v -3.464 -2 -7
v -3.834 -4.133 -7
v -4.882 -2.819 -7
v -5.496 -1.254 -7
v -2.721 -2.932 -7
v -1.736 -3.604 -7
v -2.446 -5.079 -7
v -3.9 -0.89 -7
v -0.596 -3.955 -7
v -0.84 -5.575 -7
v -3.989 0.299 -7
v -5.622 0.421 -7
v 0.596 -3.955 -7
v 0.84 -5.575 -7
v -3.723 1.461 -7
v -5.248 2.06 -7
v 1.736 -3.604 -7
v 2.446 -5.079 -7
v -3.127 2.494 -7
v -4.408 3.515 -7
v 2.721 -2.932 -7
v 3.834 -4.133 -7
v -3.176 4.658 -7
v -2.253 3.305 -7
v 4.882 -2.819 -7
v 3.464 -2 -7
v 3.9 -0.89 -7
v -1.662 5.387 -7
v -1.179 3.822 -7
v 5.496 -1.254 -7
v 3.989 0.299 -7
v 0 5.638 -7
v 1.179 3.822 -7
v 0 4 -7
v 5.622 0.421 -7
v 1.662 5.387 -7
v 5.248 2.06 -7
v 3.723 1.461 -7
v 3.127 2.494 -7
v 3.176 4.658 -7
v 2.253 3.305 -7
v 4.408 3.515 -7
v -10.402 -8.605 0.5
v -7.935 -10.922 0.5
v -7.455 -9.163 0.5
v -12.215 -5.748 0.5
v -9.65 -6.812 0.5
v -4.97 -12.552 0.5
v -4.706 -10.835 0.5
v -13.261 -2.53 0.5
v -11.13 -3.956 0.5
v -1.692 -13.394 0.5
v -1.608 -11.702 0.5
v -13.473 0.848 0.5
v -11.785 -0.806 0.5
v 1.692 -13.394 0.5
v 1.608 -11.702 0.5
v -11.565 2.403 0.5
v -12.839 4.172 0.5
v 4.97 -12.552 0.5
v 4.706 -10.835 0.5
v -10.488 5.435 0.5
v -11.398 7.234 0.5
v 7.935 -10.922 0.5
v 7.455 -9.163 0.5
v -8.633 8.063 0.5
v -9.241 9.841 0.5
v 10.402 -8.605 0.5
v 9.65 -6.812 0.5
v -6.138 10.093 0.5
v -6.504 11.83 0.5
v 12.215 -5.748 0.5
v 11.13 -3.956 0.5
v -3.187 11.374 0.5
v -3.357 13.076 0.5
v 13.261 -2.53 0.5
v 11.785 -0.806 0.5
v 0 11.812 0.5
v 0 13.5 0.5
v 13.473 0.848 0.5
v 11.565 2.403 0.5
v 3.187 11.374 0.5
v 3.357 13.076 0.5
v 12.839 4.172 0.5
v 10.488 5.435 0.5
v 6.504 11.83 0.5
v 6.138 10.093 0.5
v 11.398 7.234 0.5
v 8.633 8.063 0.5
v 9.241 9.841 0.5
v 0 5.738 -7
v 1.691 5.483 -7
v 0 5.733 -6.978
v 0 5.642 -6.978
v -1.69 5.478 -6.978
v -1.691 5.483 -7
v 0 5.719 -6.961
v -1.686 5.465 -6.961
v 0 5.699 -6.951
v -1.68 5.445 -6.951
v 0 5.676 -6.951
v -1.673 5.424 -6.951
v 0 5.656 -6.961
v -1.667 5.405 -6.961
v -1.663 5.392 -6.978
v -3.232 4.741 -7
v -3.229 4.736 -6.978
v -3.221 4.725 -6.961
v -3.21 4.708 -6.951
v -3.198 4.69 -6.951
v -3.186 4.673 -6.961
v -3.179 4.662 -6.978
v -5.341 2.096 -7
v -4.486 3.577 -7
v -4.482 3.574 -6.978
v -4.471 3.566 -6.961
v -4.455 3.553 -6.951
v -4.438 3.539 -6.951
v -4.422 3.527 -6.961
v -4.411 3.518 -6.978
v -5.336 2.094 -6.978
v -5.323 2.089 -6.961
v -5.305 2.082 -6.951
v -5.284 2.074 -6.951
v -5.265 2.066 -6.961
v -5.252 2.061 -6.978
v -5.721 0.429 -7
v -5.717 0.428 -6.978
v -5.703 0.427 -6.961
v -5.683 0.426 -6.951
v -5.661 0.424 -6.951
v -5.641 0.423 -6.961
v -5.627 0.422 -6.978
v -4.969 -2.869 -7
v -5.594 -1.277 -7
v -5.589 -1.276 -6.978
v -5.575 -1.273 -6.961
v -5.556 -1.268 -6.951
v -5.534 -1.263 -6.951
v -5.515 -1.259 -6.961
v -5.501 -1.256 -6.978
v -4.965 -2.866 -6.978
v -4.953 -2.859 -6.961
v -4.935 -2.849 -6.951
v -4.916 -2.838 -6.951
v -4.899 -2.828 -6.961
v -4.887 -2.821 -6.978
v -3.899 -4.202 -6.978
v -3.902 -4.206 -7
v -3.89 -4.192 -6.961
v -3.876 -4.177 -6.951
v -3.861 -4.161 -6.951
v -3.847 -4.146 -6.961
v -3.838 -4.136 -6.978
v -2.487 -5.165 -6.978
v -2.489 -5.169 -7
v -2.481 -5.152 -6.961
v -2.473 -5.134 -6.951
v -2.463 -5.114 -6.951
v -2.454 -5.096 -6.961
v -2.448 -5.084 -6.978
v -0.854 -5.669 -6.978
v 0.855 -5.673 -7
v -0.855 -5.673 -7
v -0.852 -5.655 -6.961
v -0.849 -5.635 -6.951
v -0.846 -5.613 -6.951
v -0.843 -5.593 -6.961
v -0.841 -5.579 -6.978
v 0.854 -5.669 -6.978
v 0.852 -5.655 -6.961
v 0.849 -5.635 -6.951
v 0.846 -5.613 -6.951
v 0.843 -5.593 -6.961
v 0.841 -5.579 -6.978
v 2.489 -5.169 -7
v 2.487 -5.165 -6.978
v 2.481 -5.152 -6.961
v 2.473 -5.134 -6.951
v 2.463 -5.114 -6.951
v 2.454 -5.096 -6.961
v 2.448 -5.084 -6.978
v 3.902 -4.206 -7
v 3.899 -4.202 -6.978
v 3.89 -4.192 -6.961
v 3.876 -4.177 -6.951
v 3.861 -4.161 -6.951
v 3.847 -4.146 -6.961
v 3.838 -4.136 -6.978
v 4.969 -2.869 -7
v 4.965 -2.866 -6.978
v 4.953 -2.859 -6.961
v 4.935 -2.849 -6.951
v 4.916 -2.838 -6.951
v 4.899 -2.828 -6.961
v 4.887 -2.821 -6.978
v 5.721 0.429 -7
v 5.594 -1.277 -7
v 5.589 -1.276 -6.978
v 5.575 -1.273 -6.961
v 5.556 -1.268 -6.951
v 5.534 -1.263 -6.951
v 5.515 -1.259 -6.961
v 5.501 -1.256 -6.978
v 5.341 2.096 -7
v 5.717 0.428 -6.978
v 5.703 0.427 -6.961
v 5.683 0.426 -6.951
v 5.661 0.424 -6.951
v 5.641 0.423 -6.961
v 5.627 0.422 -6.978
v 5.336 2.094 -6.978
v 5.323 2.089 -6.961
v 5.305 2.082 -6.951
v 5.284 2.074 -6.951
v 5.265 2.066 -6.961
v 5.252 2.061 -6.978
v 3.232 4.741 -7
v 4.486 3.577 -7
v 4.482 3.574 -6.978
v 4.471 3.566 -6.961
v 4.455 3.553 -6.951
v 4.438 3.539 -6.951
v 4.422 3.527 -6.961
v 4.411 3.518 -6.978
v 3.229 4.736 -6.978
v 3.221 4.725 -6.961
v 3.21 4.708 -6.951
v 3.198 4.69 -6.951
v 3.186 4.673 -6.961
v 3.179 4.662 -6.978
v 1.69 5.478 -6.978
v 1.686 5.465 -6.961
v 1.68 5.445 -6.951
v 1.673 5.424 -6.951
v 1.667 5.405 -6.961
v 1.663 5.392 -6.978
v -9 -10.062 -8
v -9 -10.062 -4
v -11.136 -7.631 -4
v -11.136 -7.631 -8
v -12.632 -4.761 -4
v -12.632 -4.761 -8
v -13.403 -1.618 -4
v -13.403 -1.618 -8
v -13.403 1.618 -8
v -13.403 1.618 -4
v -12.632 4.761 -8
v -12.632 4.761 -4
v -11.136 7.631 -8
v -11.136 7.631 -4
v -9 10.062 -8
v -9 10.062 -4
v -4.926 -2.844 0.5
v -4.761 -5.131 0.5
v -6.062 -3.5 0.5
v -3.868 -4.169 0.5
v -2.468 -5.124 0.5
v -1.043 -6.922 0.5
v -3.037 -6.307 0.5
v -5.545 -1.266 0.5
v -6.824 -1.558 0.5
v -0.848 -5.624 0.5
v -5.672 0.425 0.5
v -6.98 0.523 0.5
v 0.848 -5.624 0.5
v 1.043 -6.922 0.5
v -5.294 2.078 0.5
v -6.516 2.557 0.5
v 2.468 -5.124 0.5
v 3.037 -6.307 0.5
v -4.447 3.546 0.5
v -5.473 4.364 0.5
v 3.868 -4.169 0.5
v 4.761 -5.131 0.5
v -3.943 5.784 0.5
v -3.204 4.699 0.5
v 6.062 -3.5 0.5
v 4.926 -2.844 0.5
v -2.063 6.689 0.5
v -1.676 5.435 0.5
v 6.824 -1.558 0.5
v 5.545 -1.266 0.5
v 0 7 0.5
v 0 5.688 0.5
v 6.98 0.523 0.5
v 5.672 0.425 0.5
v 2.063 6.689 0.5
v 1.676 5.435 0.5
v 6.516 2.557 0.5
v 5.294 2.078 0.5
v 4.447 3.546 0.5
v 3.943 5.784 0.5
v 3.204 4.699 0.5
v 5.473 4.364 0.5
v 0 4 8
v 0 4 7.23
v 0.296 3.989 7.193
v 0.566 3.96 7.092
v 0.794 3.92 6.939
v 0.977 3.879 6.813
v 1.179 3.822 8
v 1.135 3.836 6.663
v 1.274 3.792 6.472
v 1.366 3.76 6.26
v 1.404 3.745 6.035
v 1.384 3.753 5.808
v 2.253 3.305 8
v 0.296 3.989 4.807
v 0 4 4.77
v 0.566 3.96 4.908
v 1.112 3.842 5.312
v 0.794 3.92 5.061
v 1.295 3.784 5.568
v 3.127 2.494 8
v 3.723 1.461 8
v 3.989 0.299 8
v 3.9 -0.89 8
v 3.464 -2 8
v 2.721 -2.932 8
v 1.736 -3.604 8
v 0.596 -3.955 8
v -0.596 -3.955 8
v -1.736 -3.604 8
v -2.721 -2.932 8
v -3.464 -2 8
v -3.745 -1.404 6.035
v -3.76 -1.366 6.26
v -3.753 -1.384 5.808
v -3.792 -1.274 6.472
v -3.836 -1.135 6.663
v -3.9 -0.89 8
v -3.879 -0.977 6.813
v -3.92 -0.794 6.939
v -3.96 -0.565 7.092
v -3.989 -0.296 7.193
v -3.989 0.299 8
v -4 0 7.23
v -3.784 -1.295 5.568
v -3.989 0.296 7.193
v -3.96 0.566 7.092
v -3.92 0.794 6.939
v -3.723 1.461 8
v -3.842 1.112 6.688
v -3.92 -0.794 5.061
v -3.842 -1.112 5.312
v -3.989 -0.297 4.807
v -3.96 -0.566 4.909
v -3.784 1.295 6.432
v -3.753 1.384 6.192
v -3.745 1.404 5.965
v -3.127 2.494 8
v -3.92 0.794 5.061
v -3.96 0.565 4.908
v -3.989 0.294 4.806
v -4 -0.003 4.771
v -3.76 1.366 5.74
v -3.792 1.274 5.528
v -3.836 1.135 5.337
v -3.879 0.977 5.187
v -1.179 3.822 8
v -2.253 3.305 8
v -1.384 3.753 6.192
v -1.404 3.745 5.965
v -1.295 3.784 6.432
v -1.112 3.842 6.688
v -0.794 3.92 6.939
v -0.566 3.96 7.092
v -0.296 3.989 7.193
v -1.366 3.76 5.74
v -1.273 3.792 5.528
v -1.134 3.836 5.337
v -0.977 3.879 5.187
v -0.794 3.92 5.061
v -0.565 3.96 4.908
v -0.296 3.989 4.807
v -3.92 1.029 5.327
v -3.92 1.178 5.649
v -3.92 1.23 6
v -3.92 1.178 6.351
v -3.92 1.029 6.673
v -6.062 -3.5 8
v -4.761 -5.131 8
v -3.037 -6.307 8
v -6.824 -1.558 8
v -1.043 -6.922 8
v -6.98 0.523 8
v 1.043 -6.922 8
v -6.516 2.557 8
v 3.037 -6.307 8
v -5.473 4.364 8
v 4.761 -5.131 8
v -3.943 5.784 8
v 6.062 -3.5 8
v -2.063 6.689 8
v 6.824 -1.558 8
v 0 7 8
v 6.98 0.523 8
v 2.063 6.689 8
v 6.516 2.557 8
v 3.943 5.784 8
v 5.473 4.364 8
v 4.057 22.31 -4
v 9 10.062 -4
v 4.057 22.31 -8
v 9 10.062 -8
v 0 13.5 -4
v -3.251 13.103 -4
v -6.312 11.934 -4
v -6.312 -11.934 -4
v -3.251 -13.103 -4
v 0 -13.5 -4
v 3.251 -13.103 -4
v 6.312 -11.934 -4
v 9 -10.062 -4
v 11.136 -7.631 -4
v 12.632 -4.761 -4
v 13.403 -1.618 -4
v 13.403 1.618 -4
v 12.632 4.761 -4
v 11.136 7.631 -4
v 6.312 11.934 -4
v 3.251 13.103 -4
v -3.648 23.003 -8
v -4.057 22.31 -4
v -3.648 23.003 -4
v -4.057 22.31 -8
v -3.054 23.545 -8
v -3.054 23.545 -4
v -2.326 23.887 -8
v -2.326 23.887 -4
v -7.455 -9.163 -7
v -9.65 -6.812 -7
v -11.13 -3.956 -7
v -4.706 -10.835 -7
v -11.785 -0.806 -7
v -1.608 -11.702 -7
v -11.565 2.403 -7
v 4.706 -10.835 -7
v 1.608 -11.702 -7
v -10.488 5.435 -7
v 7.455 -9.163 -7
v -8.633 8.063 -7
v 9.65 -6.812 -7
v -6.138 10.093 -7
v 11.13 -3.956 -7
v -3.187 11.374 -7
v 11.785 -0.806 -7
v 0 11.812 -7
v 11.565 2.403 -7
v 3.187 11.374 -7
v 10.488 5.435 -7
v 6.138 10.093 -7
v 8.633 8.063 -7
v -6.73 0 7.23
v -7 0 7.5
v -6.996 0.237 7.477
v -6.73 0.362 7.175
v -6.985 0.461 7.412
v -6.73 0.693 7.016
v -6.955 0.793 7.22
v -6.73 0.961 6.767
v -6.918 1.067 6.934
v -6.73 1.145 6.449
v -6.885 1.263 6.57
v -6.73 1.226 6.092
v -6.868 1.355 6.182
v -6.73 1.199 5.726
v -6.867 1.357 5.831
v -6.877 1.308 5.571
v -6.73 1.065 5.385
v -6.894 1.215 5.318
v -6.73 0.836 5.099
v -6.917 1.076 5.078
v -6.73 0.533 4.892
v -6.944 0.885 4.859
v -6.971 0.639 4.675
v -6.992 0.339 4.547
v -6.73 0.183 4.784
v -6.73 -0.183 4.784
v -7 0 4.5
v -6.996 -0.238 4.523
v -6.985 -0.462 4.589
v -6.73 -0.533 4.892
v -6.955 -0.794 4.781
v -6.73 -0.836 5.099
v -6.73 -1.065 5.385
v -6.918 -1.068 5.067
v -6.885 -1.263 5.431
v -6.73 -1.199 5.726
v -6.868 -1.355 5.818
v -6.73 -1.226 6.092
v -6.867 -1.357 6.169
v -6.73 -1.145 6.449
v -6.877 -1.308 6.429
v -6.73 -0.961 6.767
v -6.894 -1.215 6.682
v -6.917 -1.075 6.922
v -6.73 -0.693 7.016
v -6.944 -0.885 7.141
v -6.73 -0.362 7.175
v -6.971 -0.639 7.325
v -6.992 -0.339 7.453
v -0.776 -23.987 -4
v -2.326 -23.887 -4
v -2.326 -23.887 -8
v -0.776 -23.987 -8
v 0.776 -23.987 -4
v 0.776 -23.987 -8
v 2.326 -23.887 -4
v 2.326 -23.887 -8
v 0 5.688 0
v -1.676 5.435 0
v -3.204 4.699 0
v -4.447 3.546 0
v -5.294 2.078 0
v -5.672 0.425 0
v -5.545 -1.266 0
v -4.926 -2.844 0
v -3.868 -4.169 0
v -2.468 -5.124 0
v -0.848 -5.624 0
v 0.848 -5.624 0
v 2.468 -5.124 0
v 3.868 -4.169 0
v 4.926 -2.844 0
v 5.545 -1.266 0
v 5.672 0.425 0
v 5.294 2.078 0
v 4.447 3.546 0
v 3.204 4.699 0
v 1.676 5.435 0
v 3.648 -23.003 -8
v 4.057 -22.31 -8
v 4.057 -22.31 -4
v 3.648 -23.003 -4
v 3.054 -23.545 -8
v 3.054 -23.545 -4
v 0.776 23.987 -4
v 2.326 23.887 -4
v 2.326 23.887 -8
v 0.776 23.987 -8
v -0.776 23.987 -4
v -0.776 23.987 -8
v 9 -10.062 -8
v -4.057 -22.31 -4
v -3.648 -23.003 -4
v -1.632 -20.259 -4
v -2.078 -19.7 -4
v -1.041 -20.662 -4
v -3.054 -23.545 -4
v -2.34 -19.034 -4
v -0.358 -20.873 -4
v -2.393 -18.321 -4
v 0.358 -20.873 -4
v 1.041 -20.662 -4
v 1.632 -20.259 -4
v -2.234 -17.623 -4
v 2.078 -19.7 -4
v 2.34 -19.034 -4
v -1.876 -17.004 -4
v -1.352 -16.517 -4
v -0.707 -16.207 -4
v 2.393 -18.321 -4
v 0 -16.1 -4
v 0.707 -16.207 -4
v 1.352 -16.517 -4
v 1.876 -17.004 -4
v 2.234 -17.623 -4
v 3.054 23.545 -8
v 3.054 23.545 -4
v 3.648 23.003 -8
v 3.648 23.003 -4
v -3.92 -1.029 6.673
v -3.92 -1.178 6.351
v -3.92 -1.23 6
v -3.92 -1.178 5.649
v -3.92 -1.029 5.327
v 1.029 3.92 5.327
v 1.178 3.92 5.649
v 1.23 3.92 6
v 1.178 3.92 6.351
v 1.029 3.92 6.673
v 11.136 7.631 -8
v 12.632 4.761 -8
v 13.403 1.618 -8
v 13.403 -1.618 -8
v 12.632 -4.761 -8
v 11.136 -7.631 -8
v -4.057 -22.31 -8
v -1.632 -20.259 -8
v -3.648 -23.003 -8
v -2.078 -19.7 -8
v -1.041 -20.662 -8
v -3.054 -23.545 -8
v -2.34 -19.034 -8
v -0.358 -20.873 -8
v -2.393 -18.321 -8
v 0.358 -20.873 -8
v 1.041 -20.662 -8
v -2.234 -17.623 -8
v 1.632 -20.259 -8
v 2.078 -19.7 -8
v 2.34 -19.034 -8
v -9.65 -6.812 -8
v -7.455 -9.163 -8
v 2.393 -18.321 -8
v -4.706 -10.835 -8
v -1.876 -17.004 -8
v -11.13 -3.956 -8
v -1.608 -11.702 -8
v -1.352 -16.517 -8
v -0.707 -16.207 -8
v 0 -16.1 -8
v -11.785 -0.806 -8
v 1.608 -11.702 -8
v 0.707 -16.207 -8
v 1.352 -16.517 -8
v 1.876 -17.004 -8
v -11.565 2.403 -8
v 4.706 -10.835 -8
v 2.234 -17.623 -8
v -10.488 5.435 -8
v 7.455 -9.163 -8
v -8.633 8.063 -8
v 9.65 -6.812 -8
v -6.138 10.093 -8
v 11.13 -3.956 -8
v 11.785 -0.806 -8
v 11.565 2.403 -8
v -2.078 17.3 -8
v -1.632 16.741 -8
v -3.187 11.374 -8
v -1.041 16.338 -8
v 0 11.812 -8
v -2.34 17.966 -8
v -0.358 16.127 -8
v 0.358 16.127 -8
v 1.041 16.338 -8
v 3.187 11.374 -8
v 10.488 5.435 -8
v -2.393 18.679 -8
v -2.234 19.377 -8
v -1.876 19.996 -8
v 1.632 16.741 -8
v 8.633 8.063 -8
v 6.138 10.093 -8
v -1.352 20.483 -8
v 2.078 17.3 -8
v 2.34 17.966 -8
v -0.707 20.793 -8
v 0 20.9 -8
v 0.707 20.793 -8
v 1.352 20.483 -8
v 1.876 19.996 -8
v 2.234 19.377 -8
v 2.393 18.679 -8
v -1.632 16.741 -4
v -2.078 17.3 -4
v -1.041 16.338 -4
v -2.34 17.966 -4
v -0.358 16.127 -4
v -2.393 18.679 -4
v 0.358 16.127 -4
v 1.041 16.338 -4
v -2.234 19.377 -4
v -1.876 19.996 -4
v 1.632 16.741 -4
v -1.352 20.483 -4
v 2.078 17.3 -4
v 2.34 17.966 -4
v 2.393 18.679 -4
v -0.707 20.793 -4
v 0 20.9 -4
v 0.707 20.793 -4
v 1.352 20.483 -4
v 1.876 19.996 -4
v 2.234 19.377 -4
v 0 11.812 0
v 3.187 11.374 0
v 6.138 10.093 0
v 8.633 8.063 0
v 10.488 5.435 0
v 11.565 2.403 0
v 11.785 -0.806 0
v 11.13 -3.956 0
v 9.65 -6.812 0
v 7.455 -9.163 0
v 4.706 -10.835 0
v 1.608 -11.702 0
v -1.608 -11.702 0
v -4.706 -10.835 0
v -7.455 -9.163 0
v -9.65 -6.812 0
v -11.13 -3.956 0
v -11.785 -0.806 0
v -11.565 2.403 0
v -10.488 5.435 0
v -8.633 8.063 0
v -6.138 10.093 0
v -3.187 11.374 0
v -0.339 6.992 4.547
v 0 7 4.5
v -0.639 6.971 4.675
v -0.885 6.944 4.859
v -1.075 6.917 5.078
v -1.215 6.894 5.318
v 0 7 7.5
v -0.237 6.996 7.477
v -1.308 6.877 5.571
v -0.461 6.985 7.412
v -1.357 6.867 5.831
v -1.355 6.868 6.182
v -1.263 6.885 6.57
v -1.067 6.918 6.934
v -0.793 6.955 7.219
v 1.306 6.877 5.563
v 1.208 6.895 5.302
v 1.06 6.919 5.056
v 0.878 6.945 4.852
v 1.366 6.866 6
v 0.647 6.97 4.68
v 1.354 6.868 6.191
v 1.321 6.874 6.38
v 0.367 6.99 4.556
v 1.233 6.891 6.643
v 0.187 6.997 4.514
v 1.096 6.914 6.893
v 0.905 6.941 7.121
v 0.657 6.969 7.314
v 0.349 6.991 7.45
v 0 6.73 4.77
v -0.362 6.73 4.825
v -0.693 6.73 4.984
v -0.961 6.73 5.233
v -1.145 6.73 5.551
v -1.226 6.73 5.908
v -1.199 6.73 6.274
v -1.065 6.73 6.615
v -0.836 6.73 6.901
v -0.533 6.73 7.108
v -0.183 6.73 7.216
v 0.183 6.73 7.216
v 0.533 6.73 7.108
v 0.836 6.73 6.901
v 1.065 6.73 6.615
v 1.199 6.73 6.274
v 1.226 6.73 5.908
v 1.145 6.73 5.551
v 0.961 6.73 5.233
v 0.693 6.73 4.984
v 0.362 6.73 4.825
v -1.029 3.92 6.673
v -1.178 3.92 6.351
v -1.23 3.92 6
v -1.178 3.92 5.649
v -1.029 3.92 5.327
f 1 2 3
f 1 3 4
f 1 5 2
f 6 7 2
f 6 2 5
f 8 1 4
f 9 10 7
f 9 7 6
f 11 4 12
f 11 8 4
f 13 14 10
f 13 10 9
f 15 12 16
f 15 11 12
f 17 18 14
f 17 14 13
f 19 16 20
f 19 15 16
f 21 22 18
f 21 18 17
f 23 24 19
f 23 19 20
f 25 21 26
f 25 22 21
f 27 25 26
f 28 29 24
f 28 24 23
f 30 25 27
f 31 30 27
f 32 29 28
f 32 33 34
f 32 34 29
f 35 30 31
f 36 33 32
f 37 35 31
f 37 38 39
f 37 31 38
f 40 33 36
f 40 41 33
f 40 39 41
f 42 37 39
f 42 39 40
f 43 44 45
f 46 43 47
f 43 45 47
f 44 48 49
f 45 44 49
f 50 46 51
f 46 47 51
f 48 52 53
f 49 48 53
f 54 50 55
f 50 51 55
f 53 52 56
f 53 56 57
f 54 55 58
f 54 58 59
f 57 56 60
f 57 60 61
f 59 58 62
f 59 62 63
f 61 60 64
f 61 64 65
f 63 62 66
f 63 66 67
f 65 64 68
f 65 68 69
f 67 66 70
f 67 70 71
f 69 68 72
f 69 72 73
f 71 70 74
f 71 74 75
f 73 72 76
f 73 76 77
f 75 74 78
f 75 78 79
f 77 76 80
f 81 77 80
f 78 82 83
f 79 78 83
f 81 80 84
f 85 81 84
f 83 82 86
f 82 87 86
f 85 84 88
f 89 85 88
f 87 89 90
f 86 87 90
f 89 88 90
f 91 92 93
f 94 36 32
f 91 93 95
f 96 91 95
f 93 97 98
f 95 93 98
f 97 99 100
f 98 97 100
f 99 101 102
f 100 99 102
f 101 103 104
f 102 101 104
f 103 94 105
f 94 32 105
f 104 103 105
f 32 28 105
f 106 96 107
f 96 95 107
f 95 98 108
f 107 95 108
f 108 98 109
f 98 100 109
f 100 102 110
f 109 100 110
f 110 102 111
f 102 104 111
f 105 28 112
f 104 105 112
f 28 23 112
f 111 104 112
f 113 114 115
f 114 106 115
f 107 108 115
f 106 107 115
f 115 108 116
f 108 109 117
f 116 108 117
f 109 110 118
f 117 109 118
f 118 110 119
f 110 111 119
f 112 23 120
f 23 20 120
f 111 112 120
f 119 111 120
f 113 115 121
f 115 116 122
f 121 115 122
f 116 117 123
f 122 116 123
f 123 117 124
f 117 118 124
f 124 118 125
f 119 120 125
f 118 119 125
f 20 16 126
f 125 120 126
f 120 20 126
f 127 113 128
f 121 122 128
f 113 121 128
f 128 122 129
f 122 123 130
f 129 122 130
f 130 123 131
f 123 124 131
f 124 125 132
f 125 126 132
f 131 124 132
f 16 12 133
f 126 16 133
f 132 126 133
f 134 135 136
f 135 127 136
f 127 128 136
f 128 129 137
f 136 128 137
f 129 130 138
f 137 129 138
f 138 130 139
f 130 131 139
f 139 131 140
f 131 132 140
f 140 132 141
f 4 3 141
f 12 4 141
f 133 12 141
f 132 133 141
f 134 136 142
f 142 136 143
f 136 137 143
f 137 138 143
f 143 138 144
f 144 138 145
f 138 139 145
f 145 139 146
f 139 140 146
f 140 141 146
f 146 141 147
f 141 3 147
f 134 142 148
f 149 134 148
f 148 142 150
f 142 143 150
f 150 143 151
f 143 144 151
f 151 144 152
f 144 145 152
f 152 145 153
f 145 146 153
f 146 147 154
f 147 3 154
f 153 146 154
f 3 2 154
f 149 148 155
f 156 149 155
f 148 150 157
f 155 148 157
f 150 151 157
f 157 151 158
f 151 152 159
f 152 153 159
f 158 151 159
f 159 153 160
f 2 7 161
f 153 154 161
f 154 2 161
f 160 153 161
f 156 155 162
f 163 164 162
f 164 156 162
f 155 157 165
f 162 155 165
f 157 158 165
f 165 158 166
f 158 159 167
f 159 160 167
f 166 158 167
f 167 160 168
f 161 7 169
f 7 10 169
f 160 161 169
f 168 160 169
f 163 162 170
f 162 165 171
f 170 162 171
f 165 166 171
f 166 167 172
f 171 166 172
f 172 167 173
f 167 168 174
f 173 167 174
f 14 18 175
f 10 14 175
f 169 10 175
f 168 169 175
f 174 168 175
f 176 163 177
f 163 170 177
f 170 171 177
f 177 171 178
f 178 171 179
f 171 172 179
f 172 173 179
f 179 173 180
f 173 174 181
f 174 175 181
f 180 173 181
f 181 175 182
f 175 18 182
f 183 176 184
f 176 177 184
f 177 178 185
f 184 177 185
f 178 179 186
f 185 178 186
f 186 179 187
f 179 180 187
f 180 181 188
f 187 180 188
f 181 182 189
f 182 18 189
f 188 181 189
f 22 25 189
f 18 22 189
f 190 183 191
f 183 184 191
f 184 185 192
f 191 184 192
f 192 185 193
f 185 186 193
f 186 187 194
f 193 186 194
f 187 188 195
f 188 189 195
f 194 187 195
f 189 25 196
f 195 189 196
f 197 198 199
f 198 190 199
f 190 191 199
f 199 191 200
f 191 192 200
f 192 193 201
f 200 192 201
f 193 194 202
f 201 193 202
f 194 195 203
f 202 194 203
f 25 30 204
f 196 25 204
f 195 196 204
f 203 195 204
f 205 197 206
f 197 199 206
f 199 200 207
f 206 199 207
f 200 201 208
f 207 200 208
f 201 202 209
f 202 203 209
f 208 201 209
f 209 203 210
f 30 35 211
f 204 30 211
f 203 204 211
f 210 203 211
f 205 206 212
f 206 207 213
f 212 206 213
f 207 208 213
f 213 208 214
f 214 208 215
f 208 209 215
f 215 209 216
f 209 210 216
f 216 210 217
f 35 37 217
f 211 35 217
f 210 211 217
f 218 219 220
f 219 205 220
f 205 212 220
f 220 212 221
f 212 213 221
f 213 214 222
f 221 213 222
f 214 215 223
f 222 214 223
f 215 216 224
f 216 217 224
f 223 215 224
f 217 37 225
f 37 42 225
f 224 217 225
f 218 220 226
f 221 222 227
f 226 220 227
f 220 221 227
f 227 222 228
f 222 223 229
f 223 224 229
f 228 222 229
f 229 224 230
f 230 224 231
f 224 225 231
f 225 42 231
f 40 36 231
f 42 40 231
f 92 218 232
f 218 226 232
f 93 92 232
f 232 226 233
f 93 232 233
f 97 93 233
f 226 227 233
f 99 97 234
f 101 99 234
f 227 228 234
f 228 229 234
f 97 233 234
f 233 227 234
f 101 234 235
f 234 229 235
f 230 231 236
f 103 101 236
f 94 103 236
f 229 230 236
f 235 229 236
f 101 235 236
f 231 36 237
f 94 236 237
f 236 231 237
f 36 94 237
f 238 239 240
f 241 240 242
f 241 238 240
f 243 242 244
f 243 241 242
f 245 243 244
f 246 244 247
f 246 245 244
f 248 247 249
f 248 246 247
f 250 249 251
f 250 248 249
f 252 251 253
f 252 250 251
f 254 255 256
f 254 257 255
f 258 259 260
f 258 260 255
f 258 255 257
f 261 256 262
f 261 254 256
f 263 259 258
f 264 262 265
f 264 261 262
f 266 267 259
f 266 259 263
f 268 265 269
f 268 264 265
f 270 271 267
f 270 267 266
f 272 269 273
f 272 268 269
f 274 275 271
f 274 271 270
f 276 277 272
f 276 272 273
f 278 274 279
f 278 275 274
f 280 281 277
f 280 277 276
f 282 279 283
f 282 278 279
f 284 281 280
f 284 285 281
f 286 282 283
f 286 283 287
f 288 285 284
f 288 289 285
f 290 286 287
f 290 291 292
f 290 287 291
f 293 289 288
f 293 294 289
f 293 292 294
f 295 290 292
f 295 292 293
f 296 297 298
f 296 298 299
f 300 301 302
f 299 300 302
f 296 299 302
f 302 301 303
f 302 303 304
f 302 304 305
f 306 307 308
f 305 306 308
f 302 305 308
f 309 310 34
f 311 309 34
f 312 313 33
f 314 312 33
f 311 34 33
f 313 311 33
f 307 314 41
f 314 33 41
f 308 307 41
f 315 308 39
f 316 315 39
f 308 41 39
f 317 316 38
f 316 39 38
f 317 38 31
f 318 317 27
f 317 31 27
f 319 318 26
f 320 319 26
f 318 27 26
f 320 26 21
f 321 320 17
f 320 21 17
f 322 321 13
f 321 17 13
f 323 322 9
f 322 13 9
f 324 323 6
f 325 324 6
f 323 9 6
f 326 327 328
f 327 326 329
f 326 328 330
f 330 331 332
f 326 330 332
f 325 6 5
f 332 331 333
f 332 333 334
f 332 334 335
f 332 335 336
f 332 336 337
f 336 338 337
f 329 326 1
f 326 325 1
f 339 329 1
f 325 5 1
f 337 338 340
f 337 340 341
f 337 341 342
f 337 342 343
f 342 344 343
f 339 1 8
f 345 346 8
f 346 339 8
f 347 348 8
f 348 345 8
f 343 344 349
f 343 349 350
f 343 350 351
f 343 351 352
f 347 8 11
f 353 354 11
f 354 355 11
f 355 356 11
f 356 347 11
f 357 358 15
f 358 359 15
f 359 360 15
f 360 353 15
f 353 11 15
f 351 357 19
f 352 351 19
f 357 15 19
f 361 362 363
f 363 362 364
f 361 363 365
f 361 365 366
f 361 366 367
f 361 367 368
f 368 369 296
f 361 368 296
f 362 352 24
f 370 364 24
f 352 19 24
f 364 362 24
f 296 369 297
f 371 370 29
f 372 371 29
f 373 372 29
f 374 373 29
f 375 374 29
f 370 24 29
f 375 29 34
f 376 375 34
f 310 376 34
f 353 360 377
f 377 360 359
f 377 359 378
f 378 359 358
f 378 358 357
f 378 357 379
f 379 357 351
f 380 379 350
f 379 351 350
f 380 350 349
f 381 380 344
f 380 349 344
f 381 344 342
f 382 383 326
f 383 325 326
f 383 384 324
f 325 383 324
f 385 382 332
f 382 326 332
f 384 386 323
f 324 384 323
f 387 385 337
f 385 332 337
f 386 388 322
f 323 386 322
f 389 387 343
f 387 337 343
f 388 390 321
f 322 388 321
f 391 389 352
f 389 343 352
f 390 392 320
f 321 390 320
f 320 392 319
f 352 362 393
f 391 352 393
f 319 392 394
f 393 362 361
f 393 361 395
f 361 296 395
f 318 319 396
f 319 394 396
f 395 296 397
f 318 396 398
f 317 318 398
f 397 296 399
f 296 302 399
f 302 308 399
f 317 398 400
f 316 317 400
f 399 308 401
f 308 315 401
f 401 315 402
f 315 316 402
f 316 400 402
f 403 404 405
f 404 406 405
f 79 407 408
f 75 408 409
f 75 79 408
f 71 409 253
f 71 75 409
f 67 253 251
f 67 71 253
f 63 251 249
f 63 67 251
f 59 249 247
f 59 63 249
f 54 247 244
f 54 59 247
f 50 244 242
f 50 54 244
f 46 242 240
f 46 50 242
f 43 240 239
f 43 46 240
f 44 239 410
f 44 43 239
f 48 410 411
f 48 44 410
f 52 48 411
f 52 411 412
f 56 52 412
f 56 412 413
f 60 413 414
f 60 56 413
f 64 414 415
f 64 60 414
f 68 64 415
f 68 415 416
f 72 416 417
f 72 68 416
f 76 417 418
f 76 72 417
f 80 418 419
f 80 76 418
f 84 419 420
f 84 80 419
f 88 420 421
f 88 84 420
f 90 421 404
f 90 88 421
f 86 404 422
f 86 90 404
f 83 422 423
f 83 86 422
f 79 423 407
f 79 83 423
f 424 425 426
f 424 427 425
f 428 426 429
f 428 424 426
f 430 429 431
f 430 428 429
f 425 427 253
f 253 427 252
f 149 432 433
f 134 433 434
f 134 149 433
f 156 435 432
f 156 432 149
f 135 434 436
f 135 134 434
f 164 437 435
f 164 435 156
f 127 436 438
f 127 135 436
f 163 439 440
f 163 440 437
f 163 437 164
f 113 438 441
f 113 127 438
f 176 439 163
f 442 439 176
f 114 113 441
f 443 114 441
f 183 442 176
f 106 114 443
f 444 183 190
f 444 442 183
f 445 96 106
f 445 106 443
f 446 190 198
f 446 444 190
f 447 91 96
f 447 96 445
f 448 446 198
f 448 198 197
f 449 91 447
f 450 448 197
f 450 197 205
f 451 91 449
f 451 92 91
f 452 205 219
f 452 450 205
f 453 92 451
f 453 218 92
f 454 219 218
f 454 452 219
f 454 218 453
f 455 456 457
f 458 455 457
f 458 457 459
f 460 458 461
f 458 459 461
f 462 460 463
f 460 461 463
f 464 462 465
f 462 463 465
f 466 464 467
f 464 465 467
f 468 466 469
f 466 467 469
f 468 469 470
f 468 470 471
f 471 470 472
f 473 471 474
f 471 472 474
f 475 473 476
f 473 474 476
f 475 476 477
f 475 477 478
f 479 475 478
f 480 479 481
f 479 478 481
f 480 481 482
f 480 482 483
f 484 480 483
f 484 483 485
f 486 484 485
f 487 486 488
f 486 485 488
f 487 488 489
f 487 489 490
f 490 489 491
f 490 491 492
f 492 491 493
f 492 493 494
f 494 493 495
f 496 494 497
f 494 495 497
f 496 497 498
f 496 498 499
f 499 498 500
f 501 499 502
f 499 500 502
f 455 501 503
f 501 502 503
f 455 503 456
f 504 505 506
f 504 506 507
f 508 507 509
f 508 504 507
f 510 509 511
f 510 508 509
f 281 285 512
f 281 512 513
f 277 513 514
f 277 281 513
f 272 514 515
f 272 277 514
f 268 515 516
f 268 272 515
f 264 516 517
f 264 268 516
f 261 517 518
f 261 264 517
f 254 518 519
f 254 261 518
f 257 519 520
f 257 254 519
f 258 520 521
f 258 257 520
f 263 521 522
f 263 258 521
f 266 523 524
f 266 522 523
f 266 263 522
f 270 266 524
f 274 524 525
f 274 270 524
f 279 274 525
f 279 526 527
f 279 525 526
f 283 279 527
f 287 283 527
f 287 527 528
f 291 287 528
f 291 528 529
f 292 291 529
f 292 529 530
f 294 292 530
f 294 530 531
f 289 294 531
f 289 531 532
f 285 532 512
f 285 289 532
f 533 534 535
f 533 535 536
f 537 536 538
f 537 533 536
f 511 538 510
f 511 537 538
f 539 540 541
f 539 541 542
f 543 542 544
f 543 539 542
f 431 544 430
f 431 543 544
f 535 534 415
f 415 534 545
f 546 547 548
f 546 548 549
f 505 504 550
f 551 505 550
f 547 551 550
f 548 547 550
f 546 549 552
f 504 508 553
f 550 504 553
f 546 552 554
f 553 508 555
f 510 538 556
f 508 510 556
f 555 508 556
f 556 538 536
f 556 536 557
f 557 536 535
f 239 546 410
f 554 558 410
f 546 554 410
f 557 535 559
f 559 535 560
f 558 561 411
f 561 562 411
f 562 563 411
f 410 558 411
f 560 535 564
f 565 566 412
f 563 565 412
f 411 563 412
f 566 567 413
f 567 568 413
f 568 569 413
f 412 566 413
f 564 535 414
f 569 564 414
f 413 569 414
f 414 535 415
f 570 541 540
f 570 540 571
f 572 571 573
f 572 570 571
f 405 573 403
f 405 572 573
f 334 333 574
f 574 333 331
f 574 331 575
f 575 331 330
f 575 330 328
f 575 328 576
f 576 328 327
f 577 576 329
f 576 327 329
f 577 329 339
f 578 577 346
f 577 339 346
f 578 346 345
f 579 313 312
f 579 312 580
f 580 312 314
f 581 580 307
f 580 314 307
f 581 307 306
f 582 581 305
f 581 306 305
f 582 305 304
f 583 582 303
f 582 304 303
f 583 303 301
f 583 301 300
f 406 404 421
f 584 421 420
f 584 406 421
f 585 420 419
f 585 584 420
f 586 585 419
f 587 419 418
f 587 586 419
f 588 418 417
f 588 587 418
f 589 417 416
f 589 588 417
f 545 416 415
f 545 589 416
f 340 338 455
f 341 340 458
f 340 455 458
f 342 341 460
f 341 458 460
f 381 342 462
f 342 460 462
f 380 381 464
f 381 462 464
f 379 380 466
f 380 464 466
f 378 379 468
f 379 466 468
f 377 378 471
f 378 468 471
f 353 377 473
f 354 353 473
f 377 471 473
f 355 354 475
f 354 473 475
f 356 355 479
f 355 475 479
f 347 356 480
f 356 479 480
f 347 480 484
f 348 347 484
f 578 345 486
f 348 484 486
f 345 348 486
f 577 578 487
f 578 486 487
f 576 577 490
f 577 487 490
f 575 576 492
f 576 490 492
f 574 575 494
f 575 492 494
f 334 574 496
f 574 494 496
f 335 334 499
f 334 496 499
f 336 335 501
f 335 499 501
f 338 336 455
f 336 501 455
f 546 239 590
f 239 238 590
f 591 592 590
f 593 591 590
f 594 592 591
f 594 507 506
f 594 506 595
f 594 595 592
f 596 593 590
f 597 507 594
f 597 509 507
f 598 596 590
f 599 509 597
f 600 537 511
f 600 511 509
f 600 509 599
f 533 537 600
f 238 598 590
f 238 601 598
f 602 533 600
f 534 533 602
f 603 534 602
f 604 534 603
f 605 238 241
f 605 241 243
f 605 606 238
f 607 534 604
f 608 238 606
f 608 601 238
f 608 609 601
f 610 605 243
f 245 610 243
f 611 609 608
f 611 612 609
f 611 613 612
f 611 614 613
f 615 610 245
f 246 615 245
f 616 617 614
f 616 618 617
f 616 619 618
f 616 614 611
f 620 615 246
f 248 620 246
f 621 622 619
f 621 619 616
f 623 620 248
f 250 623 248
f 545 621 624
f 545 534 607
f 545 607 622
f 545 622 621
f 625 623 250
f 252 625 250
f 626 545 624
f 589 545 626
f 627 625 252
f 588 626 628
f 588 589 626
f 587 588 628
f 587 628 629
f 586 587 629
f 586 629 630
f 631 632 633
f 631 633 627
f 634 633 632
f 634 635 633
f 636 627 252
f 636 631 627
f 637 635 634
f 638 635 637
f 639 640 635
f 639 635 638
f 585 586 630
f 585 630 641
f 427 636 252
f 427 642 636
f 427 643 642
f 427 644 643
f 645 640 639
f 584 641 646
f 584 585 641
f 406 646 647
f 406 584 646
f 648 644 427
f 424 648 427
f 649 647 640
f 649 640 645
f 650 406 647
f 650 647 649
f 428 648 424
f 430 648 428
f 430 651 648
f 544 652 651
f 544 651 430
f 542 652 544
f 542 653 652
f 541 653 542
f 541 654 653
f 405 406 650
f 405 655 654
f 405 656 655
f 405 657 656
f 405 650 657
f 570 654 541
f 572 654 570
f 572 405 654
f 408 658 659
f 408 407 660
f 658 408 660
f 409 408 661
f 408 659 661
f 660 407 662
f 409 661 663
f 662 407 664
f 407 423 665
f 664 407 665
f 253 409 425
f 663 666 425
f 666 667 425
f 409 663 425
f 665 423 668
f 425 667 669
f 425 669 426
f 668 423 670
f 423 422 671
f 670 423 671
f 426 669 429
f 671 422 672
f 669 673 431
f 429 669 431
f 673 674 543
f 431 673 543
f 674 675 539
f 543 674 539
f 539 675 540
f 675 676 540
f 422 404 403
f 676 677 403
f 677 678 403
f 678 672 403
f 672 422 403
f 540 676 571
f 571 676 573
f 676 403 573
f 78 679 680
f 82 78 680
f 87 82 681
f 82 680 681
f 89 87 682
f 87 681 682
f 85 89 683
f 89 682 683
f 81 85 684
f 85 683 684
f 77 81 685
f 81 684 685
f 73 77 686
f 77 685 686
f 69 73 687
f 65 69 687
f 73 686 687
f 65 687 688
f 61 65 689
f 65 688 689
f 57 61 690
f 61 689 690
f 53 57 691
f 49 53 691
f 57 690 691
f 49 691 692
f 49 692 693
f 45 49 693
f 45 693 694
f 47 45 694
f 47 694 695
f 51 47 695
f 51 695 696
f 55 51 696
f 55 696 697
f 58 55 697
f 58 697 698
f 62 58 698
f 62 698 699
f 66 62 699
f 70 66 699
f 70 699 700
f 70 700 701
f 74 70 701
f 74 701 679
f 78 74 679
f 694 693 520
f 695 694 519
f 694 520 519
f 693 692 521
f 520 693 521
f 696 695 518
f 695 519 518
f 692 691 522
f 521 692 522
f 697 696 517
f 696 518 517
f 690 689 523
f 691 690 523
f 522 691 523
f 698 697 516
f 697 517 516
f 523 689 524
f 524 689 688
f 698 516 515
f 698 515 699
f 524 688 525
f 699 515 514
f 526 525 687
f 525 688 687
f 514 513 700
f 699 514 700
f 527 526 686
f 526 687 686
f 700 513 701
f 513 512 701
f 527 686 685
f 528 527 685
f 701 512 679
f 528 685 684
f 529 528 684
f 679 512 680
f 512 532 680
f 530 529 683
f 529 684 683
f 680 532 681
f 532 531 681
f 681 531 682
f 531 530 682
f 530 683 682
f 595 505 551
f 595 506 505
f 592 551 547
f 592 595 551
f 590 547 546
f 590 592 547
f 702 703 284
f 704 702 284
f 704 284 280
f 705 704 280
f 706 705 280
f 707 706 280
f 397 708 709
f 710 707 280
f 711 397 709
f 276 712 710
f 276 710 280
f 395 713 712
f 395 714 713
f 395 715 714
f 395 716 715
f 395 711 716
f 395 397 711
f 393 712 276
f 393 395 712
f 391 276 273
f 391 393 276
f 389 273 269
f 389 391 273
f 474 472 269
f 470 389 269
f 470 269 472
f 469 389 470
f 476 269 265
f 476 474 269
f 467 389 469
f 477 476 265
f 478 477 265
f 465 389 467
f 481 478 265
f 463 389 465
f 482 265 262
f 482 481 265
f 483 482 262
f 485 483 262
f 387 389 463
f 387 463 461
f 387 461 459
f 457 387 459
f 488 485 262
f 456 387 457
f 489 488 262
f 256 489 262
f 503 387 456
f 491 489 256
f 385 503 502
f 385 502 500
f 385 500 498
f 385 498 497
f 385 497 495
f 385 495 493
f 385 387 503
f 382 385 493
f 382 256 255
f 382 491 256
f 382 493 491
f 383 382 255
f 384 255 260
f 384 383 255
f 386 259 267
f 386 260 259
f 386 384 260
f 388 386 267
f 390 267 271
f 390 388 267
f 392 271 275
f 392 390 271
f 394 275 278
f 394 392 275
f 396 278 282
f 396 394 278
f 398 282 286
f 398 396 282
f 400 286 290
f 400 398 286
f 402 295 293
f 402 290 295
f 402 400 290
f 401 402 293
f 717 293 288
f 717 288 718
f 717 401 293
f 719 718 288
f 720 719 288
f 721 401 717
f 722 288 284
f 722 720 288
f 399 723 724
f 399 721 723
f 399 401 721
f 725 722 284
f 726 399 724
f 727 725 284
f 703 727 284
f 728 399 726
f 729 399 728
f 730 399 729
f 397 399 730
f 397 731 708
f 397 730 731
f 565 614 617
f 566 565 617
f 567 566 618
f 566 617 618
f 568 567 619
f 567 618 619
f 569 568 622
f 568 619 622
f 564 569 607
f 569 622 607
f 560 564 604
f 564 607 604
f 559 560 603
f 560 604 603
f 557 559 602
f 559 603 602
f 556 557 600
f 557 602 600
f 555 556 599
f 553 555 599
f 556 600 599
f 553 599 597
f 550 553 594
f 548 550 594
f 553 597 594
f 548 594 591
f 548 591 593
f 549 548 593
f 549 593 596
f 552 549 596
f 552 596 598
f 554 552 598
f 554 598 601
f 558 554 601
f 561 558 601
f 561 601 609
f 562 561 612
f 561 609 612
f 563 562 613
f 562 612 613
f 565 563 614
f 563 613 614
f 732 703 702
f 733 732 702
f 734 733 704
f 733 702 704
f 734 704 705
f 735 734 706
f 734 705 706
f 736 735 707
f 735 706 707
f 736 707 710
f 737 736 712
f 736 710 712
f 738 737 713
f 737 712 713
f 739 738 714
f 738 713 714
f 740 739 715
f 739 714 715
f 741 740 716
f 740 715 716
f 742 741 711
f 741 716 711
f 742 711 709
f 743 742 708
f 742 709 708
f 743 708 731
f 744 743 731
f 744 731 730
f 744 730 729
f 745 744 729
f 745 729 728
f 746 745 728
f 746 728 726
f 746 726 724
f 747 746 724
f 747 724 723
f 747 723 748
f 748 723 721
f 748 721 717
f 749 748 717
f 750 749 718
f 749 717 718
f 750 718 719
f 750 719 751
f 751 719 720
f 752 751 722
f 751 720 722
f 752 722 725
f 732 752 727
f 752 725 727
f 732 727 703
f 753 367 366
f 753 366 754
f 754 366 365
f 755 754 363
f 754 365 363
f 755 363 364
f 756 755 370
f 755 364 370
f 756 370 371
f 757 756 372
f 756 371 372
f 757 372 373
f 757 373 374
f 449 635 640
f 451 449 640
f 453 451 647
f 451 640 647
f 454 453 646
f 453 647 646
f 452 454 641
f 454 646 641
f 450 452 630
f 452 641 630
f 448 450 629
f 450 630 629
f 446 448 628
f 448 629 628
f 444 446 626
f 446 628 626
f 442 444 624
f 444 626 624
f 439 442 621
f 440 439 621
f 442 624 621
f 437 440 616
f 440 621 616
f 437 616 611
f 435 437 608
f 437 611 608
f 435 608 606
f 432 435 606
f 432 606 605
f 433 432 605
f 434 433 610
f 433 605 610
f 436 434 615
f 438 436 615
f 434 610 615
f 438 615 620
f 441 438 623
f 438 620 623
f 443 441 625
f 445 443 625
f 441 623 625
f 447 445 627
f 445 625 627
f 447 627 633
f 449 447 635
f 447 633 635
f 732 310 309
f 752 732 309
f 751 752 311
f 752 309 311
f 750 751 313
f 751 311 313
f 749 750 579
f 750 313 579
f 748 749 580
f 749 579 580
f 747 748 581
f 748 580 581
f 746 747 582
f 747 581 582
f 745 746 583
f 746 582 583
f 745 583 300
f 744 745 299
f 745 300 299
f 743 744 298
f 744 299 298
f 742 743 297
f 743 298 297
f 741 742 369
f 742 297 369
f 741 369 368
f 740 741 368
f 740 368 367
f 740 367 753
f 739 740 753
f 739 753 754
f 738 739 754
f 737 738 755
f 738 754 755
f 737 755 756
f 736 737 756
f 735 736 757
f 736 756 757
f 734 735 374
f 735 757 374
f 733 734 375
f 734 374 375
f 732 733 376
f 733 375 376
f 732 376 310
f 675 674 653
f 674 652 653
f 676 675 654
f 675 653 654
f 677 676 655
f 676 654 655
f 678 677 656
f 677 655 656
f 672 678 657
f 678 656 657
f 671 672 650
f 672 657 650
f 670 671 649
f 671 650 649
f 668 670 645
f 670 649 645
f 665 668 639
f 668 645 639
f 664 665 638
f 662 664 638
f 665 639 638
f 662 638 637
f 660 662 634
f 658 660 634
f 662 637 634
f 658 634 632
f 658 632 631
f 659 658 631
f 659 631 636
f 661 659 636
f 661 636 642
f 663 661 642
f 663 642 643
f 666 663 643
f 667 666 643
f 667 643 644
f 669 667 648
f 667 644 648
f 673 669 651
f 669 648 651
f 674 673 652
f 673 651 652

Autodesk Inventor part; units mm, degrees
sketch "Sketch_1" plane through (0, 0, 0) normal (1, 0, 0) x (0, 1, 0)
  line L0 (0, -8) -> (0, 8)
  line L1 (7, 8) -> (4, 8)
  line L2 (4, 8) -> (4, -7)
  line L3 (4, -7) -> (5.6375, -7)
  arc A0 (5.7375, -7) -> (5.6375, -7) centre (5.6875, -7) ccw
  line L4 (5.7375, -7) -> (11.8125, -7)
  line L5 (11.8125, -7) -> (11.8125, -8)
  line L6 (11.8125, -8) -> (24, -8)
  line L7 (24, -8) -> (24, -4)
  line L8 (24, -4) -> (13.5, -4)
  line L9 (13.5, -4) -> (13.5, 0.5)
  line L10 (13.5, 0.5) -> (11.8125, 0.5)
  line L11 (11.8125, 0.5) -> (11.8125, 0)
  line L12 (11.8125, 0) -> (5.6875, 0)
  line L13 (5.6875, 0) -> (5.6875, 0.5)
  line L14 (5.6875, 0.5) -> (7, 0.5)
  line L15 (7, 0.5) -> (7, 8)
revolve "Revolution1" add sketch "Sketch_1" angle 360 about axis through (0, 0, -8) along (0, 0, -1)
sketch "Sketch_2" plane through (0, 0, 0) normal (0, 0, 1) x (1, 0, 0)
  line L0 (-54, -96) -> (54, -96)
  line L1 (54, -96) -> (54, 96)
  line L2 (54, 96) -> (-54, 96)
  line L3 (-54, 96) -> (-54, -96)
  arc A0 (-9, 10.0623) -> (-9, -10.0623) centre (0, 0) ccw
  line L4 (-9, -10.0623) -> (-4.0569, -22.3105)
  arc A1 (-4.0569, -22.3105) -> (-1.5531, -24) centre (-1.5531, -21.3) ccw
  line L5 (-1.5531, -24) -> (1.5531, -24)
  arc A2 (1.5531, -24) -> (4.0569, -22.3105) centre (1.5531, -21.3) ccw
  line L6 (4.0569, -22.3105) -> (9, -10.0623)
  arc A3 (9, -10.0623) -> (9, 10.0623) centre (0, 0) ccw
  line L7 (9, 10.0623) -> (4.0569, 22.3105)
  arc A4 (4.0569, 22.3105) -> (1.5531, 24) centre (1.5531, 21.3) ccw
  line L8 (1.5531, 24) -> (-1.5531, 24)
  arc A5 (-1.5531, 24) -> (-4.0569, 22.3105) centre (-1.5531, 21.3) ccw
  line L9 (-4.0569, 22.3105) -> (-9, 10.0623)
extrude "Extrusion1" cut sketch "Sketch_2" along normal mid plane 32
sketch "Sketch_3" plane through (0, 0, 0) normal (1, 0, 0) x (0, 1, 0)
  line L0 (18.5, -8) -> (18.5, 8)
  line L1 (18.5, 8) -> (22.34, 8)
  line L2 (22.34, 8) -> (22.34, -4)
  line L3 (22.34, -4) -> (20.9, -4)
  line L4 (20.9, -4) -> (20.9, -8)
  line L5 (20.9, -8) -> (18.5, -8)
  line L6 (18.5, -8) -> (18.5, 8)
revolve "Revolution2" cut sketch "Sketch_3" angle 360 about axis through (0, 18.5, -8) along (0, 0, -1)
sketch "Sketch_4" plane through (0, 0, 0) normal (1, 0, 0) x (0, 1, 0)
  line L0 (-18.5, -8) -> (-18.5, 8)
  line L1 (-18.5, 8) -> (-14.66, 8)
  line L2 (-14.66, 8) -> (-14.66, -4)
  line L3 (-14.66, -4) -> (-16.1, -4)
  line L4 (-16.1, -4) -> (-16.1, -8)
  line L5 (-16.1, -8) -> (-18.5, -8)
  line L6 (-18.5, -8) -> (-18.5, 8)
revolve "Revolution3" cut sketch "Sketch_4" angle 360 about axis through (0, -18.5, -8) along (0, 0, -1)
sketch "Sketch_5" plane through (0, 0, 0) normal (1, 0, 0) x (0, 1, 0)
  line L0 (3.65, 6) -> (7, 6)
  line L1 (7, 6) -> (7, 4.5)
  line L2 (7, 4.5) -> (6.7295, 4.7705)
  line L3 (6.7295, 4.7705) -> (3.9205, 4.7705)
  line L4 (3.9205, 4.7705) -> (3.65, 4.5)
  line L5 (3.65, 4.5) -> (3.65, 6)
  line L6 (3.65, 6) -> (7, 6)
revolve "Revolution4" cut sketch "Sketch_5" angle 360 about axis through (0, 3.65, 6) along (0, -1, 0)
thread "Thread1" size "M3x0.5" class "6H" standard "ISO Metric profile" full length
sketch "Sketch_6" plane through (0, 0, 0) normal (0, 1, 0) x (-1, 0, 0)
  line L0 (7, 6) -> (3.65, 6)
  line L1 (3.65, 6) -> (3.65, 7.5)
  line L2 (3.65, 7.5) -> (3.9205, 7.2295)
  line L3 (3.9205, 7.2295) -> (6.7295, 7.2295)
  line L4 (6.7295, 7.2295) -> (7, 7.5)
  line L5 (7, 7.5) -> (7, 6)
  line L6 (7, 6) -> (3.65, 6)
revolve "Revolution5" cut sketch "Sketch_6" angle 360 about axis through (-7, 0, 6) along (-1, 0, 0)
thread "Thread2" size "M3x0.5" class "6H" standard "ISO Metric profile" full length
ref_plane "to_screw_XY" through (0, 4, 6) normal (0, 1, 0) x (1, 0, 0)
ref_plane "to_screw_YZ" through (0, 4, 6) normal (1, 0, 0) x (0, 0, -1)
ref_plane "to_screw_ZX" through (0, 4, 6) normal (0, 0, -1) x (0, 1, 0)
ref_plane "to_screw_2_XY" through (-4, 0, 6) normal (-1, 0, 0) x (0, 0, -1)
ref_plane "to_screw_2_YZ" through (-4, 0, 6) normal (0, 0, -1) x (0, -1, 0)
ref_plane "to_screw_2_ZX" through (-4, 0, 6) normal (0, -1, 0) x (-1, 0, 0)
properties part number "HBR8x"
